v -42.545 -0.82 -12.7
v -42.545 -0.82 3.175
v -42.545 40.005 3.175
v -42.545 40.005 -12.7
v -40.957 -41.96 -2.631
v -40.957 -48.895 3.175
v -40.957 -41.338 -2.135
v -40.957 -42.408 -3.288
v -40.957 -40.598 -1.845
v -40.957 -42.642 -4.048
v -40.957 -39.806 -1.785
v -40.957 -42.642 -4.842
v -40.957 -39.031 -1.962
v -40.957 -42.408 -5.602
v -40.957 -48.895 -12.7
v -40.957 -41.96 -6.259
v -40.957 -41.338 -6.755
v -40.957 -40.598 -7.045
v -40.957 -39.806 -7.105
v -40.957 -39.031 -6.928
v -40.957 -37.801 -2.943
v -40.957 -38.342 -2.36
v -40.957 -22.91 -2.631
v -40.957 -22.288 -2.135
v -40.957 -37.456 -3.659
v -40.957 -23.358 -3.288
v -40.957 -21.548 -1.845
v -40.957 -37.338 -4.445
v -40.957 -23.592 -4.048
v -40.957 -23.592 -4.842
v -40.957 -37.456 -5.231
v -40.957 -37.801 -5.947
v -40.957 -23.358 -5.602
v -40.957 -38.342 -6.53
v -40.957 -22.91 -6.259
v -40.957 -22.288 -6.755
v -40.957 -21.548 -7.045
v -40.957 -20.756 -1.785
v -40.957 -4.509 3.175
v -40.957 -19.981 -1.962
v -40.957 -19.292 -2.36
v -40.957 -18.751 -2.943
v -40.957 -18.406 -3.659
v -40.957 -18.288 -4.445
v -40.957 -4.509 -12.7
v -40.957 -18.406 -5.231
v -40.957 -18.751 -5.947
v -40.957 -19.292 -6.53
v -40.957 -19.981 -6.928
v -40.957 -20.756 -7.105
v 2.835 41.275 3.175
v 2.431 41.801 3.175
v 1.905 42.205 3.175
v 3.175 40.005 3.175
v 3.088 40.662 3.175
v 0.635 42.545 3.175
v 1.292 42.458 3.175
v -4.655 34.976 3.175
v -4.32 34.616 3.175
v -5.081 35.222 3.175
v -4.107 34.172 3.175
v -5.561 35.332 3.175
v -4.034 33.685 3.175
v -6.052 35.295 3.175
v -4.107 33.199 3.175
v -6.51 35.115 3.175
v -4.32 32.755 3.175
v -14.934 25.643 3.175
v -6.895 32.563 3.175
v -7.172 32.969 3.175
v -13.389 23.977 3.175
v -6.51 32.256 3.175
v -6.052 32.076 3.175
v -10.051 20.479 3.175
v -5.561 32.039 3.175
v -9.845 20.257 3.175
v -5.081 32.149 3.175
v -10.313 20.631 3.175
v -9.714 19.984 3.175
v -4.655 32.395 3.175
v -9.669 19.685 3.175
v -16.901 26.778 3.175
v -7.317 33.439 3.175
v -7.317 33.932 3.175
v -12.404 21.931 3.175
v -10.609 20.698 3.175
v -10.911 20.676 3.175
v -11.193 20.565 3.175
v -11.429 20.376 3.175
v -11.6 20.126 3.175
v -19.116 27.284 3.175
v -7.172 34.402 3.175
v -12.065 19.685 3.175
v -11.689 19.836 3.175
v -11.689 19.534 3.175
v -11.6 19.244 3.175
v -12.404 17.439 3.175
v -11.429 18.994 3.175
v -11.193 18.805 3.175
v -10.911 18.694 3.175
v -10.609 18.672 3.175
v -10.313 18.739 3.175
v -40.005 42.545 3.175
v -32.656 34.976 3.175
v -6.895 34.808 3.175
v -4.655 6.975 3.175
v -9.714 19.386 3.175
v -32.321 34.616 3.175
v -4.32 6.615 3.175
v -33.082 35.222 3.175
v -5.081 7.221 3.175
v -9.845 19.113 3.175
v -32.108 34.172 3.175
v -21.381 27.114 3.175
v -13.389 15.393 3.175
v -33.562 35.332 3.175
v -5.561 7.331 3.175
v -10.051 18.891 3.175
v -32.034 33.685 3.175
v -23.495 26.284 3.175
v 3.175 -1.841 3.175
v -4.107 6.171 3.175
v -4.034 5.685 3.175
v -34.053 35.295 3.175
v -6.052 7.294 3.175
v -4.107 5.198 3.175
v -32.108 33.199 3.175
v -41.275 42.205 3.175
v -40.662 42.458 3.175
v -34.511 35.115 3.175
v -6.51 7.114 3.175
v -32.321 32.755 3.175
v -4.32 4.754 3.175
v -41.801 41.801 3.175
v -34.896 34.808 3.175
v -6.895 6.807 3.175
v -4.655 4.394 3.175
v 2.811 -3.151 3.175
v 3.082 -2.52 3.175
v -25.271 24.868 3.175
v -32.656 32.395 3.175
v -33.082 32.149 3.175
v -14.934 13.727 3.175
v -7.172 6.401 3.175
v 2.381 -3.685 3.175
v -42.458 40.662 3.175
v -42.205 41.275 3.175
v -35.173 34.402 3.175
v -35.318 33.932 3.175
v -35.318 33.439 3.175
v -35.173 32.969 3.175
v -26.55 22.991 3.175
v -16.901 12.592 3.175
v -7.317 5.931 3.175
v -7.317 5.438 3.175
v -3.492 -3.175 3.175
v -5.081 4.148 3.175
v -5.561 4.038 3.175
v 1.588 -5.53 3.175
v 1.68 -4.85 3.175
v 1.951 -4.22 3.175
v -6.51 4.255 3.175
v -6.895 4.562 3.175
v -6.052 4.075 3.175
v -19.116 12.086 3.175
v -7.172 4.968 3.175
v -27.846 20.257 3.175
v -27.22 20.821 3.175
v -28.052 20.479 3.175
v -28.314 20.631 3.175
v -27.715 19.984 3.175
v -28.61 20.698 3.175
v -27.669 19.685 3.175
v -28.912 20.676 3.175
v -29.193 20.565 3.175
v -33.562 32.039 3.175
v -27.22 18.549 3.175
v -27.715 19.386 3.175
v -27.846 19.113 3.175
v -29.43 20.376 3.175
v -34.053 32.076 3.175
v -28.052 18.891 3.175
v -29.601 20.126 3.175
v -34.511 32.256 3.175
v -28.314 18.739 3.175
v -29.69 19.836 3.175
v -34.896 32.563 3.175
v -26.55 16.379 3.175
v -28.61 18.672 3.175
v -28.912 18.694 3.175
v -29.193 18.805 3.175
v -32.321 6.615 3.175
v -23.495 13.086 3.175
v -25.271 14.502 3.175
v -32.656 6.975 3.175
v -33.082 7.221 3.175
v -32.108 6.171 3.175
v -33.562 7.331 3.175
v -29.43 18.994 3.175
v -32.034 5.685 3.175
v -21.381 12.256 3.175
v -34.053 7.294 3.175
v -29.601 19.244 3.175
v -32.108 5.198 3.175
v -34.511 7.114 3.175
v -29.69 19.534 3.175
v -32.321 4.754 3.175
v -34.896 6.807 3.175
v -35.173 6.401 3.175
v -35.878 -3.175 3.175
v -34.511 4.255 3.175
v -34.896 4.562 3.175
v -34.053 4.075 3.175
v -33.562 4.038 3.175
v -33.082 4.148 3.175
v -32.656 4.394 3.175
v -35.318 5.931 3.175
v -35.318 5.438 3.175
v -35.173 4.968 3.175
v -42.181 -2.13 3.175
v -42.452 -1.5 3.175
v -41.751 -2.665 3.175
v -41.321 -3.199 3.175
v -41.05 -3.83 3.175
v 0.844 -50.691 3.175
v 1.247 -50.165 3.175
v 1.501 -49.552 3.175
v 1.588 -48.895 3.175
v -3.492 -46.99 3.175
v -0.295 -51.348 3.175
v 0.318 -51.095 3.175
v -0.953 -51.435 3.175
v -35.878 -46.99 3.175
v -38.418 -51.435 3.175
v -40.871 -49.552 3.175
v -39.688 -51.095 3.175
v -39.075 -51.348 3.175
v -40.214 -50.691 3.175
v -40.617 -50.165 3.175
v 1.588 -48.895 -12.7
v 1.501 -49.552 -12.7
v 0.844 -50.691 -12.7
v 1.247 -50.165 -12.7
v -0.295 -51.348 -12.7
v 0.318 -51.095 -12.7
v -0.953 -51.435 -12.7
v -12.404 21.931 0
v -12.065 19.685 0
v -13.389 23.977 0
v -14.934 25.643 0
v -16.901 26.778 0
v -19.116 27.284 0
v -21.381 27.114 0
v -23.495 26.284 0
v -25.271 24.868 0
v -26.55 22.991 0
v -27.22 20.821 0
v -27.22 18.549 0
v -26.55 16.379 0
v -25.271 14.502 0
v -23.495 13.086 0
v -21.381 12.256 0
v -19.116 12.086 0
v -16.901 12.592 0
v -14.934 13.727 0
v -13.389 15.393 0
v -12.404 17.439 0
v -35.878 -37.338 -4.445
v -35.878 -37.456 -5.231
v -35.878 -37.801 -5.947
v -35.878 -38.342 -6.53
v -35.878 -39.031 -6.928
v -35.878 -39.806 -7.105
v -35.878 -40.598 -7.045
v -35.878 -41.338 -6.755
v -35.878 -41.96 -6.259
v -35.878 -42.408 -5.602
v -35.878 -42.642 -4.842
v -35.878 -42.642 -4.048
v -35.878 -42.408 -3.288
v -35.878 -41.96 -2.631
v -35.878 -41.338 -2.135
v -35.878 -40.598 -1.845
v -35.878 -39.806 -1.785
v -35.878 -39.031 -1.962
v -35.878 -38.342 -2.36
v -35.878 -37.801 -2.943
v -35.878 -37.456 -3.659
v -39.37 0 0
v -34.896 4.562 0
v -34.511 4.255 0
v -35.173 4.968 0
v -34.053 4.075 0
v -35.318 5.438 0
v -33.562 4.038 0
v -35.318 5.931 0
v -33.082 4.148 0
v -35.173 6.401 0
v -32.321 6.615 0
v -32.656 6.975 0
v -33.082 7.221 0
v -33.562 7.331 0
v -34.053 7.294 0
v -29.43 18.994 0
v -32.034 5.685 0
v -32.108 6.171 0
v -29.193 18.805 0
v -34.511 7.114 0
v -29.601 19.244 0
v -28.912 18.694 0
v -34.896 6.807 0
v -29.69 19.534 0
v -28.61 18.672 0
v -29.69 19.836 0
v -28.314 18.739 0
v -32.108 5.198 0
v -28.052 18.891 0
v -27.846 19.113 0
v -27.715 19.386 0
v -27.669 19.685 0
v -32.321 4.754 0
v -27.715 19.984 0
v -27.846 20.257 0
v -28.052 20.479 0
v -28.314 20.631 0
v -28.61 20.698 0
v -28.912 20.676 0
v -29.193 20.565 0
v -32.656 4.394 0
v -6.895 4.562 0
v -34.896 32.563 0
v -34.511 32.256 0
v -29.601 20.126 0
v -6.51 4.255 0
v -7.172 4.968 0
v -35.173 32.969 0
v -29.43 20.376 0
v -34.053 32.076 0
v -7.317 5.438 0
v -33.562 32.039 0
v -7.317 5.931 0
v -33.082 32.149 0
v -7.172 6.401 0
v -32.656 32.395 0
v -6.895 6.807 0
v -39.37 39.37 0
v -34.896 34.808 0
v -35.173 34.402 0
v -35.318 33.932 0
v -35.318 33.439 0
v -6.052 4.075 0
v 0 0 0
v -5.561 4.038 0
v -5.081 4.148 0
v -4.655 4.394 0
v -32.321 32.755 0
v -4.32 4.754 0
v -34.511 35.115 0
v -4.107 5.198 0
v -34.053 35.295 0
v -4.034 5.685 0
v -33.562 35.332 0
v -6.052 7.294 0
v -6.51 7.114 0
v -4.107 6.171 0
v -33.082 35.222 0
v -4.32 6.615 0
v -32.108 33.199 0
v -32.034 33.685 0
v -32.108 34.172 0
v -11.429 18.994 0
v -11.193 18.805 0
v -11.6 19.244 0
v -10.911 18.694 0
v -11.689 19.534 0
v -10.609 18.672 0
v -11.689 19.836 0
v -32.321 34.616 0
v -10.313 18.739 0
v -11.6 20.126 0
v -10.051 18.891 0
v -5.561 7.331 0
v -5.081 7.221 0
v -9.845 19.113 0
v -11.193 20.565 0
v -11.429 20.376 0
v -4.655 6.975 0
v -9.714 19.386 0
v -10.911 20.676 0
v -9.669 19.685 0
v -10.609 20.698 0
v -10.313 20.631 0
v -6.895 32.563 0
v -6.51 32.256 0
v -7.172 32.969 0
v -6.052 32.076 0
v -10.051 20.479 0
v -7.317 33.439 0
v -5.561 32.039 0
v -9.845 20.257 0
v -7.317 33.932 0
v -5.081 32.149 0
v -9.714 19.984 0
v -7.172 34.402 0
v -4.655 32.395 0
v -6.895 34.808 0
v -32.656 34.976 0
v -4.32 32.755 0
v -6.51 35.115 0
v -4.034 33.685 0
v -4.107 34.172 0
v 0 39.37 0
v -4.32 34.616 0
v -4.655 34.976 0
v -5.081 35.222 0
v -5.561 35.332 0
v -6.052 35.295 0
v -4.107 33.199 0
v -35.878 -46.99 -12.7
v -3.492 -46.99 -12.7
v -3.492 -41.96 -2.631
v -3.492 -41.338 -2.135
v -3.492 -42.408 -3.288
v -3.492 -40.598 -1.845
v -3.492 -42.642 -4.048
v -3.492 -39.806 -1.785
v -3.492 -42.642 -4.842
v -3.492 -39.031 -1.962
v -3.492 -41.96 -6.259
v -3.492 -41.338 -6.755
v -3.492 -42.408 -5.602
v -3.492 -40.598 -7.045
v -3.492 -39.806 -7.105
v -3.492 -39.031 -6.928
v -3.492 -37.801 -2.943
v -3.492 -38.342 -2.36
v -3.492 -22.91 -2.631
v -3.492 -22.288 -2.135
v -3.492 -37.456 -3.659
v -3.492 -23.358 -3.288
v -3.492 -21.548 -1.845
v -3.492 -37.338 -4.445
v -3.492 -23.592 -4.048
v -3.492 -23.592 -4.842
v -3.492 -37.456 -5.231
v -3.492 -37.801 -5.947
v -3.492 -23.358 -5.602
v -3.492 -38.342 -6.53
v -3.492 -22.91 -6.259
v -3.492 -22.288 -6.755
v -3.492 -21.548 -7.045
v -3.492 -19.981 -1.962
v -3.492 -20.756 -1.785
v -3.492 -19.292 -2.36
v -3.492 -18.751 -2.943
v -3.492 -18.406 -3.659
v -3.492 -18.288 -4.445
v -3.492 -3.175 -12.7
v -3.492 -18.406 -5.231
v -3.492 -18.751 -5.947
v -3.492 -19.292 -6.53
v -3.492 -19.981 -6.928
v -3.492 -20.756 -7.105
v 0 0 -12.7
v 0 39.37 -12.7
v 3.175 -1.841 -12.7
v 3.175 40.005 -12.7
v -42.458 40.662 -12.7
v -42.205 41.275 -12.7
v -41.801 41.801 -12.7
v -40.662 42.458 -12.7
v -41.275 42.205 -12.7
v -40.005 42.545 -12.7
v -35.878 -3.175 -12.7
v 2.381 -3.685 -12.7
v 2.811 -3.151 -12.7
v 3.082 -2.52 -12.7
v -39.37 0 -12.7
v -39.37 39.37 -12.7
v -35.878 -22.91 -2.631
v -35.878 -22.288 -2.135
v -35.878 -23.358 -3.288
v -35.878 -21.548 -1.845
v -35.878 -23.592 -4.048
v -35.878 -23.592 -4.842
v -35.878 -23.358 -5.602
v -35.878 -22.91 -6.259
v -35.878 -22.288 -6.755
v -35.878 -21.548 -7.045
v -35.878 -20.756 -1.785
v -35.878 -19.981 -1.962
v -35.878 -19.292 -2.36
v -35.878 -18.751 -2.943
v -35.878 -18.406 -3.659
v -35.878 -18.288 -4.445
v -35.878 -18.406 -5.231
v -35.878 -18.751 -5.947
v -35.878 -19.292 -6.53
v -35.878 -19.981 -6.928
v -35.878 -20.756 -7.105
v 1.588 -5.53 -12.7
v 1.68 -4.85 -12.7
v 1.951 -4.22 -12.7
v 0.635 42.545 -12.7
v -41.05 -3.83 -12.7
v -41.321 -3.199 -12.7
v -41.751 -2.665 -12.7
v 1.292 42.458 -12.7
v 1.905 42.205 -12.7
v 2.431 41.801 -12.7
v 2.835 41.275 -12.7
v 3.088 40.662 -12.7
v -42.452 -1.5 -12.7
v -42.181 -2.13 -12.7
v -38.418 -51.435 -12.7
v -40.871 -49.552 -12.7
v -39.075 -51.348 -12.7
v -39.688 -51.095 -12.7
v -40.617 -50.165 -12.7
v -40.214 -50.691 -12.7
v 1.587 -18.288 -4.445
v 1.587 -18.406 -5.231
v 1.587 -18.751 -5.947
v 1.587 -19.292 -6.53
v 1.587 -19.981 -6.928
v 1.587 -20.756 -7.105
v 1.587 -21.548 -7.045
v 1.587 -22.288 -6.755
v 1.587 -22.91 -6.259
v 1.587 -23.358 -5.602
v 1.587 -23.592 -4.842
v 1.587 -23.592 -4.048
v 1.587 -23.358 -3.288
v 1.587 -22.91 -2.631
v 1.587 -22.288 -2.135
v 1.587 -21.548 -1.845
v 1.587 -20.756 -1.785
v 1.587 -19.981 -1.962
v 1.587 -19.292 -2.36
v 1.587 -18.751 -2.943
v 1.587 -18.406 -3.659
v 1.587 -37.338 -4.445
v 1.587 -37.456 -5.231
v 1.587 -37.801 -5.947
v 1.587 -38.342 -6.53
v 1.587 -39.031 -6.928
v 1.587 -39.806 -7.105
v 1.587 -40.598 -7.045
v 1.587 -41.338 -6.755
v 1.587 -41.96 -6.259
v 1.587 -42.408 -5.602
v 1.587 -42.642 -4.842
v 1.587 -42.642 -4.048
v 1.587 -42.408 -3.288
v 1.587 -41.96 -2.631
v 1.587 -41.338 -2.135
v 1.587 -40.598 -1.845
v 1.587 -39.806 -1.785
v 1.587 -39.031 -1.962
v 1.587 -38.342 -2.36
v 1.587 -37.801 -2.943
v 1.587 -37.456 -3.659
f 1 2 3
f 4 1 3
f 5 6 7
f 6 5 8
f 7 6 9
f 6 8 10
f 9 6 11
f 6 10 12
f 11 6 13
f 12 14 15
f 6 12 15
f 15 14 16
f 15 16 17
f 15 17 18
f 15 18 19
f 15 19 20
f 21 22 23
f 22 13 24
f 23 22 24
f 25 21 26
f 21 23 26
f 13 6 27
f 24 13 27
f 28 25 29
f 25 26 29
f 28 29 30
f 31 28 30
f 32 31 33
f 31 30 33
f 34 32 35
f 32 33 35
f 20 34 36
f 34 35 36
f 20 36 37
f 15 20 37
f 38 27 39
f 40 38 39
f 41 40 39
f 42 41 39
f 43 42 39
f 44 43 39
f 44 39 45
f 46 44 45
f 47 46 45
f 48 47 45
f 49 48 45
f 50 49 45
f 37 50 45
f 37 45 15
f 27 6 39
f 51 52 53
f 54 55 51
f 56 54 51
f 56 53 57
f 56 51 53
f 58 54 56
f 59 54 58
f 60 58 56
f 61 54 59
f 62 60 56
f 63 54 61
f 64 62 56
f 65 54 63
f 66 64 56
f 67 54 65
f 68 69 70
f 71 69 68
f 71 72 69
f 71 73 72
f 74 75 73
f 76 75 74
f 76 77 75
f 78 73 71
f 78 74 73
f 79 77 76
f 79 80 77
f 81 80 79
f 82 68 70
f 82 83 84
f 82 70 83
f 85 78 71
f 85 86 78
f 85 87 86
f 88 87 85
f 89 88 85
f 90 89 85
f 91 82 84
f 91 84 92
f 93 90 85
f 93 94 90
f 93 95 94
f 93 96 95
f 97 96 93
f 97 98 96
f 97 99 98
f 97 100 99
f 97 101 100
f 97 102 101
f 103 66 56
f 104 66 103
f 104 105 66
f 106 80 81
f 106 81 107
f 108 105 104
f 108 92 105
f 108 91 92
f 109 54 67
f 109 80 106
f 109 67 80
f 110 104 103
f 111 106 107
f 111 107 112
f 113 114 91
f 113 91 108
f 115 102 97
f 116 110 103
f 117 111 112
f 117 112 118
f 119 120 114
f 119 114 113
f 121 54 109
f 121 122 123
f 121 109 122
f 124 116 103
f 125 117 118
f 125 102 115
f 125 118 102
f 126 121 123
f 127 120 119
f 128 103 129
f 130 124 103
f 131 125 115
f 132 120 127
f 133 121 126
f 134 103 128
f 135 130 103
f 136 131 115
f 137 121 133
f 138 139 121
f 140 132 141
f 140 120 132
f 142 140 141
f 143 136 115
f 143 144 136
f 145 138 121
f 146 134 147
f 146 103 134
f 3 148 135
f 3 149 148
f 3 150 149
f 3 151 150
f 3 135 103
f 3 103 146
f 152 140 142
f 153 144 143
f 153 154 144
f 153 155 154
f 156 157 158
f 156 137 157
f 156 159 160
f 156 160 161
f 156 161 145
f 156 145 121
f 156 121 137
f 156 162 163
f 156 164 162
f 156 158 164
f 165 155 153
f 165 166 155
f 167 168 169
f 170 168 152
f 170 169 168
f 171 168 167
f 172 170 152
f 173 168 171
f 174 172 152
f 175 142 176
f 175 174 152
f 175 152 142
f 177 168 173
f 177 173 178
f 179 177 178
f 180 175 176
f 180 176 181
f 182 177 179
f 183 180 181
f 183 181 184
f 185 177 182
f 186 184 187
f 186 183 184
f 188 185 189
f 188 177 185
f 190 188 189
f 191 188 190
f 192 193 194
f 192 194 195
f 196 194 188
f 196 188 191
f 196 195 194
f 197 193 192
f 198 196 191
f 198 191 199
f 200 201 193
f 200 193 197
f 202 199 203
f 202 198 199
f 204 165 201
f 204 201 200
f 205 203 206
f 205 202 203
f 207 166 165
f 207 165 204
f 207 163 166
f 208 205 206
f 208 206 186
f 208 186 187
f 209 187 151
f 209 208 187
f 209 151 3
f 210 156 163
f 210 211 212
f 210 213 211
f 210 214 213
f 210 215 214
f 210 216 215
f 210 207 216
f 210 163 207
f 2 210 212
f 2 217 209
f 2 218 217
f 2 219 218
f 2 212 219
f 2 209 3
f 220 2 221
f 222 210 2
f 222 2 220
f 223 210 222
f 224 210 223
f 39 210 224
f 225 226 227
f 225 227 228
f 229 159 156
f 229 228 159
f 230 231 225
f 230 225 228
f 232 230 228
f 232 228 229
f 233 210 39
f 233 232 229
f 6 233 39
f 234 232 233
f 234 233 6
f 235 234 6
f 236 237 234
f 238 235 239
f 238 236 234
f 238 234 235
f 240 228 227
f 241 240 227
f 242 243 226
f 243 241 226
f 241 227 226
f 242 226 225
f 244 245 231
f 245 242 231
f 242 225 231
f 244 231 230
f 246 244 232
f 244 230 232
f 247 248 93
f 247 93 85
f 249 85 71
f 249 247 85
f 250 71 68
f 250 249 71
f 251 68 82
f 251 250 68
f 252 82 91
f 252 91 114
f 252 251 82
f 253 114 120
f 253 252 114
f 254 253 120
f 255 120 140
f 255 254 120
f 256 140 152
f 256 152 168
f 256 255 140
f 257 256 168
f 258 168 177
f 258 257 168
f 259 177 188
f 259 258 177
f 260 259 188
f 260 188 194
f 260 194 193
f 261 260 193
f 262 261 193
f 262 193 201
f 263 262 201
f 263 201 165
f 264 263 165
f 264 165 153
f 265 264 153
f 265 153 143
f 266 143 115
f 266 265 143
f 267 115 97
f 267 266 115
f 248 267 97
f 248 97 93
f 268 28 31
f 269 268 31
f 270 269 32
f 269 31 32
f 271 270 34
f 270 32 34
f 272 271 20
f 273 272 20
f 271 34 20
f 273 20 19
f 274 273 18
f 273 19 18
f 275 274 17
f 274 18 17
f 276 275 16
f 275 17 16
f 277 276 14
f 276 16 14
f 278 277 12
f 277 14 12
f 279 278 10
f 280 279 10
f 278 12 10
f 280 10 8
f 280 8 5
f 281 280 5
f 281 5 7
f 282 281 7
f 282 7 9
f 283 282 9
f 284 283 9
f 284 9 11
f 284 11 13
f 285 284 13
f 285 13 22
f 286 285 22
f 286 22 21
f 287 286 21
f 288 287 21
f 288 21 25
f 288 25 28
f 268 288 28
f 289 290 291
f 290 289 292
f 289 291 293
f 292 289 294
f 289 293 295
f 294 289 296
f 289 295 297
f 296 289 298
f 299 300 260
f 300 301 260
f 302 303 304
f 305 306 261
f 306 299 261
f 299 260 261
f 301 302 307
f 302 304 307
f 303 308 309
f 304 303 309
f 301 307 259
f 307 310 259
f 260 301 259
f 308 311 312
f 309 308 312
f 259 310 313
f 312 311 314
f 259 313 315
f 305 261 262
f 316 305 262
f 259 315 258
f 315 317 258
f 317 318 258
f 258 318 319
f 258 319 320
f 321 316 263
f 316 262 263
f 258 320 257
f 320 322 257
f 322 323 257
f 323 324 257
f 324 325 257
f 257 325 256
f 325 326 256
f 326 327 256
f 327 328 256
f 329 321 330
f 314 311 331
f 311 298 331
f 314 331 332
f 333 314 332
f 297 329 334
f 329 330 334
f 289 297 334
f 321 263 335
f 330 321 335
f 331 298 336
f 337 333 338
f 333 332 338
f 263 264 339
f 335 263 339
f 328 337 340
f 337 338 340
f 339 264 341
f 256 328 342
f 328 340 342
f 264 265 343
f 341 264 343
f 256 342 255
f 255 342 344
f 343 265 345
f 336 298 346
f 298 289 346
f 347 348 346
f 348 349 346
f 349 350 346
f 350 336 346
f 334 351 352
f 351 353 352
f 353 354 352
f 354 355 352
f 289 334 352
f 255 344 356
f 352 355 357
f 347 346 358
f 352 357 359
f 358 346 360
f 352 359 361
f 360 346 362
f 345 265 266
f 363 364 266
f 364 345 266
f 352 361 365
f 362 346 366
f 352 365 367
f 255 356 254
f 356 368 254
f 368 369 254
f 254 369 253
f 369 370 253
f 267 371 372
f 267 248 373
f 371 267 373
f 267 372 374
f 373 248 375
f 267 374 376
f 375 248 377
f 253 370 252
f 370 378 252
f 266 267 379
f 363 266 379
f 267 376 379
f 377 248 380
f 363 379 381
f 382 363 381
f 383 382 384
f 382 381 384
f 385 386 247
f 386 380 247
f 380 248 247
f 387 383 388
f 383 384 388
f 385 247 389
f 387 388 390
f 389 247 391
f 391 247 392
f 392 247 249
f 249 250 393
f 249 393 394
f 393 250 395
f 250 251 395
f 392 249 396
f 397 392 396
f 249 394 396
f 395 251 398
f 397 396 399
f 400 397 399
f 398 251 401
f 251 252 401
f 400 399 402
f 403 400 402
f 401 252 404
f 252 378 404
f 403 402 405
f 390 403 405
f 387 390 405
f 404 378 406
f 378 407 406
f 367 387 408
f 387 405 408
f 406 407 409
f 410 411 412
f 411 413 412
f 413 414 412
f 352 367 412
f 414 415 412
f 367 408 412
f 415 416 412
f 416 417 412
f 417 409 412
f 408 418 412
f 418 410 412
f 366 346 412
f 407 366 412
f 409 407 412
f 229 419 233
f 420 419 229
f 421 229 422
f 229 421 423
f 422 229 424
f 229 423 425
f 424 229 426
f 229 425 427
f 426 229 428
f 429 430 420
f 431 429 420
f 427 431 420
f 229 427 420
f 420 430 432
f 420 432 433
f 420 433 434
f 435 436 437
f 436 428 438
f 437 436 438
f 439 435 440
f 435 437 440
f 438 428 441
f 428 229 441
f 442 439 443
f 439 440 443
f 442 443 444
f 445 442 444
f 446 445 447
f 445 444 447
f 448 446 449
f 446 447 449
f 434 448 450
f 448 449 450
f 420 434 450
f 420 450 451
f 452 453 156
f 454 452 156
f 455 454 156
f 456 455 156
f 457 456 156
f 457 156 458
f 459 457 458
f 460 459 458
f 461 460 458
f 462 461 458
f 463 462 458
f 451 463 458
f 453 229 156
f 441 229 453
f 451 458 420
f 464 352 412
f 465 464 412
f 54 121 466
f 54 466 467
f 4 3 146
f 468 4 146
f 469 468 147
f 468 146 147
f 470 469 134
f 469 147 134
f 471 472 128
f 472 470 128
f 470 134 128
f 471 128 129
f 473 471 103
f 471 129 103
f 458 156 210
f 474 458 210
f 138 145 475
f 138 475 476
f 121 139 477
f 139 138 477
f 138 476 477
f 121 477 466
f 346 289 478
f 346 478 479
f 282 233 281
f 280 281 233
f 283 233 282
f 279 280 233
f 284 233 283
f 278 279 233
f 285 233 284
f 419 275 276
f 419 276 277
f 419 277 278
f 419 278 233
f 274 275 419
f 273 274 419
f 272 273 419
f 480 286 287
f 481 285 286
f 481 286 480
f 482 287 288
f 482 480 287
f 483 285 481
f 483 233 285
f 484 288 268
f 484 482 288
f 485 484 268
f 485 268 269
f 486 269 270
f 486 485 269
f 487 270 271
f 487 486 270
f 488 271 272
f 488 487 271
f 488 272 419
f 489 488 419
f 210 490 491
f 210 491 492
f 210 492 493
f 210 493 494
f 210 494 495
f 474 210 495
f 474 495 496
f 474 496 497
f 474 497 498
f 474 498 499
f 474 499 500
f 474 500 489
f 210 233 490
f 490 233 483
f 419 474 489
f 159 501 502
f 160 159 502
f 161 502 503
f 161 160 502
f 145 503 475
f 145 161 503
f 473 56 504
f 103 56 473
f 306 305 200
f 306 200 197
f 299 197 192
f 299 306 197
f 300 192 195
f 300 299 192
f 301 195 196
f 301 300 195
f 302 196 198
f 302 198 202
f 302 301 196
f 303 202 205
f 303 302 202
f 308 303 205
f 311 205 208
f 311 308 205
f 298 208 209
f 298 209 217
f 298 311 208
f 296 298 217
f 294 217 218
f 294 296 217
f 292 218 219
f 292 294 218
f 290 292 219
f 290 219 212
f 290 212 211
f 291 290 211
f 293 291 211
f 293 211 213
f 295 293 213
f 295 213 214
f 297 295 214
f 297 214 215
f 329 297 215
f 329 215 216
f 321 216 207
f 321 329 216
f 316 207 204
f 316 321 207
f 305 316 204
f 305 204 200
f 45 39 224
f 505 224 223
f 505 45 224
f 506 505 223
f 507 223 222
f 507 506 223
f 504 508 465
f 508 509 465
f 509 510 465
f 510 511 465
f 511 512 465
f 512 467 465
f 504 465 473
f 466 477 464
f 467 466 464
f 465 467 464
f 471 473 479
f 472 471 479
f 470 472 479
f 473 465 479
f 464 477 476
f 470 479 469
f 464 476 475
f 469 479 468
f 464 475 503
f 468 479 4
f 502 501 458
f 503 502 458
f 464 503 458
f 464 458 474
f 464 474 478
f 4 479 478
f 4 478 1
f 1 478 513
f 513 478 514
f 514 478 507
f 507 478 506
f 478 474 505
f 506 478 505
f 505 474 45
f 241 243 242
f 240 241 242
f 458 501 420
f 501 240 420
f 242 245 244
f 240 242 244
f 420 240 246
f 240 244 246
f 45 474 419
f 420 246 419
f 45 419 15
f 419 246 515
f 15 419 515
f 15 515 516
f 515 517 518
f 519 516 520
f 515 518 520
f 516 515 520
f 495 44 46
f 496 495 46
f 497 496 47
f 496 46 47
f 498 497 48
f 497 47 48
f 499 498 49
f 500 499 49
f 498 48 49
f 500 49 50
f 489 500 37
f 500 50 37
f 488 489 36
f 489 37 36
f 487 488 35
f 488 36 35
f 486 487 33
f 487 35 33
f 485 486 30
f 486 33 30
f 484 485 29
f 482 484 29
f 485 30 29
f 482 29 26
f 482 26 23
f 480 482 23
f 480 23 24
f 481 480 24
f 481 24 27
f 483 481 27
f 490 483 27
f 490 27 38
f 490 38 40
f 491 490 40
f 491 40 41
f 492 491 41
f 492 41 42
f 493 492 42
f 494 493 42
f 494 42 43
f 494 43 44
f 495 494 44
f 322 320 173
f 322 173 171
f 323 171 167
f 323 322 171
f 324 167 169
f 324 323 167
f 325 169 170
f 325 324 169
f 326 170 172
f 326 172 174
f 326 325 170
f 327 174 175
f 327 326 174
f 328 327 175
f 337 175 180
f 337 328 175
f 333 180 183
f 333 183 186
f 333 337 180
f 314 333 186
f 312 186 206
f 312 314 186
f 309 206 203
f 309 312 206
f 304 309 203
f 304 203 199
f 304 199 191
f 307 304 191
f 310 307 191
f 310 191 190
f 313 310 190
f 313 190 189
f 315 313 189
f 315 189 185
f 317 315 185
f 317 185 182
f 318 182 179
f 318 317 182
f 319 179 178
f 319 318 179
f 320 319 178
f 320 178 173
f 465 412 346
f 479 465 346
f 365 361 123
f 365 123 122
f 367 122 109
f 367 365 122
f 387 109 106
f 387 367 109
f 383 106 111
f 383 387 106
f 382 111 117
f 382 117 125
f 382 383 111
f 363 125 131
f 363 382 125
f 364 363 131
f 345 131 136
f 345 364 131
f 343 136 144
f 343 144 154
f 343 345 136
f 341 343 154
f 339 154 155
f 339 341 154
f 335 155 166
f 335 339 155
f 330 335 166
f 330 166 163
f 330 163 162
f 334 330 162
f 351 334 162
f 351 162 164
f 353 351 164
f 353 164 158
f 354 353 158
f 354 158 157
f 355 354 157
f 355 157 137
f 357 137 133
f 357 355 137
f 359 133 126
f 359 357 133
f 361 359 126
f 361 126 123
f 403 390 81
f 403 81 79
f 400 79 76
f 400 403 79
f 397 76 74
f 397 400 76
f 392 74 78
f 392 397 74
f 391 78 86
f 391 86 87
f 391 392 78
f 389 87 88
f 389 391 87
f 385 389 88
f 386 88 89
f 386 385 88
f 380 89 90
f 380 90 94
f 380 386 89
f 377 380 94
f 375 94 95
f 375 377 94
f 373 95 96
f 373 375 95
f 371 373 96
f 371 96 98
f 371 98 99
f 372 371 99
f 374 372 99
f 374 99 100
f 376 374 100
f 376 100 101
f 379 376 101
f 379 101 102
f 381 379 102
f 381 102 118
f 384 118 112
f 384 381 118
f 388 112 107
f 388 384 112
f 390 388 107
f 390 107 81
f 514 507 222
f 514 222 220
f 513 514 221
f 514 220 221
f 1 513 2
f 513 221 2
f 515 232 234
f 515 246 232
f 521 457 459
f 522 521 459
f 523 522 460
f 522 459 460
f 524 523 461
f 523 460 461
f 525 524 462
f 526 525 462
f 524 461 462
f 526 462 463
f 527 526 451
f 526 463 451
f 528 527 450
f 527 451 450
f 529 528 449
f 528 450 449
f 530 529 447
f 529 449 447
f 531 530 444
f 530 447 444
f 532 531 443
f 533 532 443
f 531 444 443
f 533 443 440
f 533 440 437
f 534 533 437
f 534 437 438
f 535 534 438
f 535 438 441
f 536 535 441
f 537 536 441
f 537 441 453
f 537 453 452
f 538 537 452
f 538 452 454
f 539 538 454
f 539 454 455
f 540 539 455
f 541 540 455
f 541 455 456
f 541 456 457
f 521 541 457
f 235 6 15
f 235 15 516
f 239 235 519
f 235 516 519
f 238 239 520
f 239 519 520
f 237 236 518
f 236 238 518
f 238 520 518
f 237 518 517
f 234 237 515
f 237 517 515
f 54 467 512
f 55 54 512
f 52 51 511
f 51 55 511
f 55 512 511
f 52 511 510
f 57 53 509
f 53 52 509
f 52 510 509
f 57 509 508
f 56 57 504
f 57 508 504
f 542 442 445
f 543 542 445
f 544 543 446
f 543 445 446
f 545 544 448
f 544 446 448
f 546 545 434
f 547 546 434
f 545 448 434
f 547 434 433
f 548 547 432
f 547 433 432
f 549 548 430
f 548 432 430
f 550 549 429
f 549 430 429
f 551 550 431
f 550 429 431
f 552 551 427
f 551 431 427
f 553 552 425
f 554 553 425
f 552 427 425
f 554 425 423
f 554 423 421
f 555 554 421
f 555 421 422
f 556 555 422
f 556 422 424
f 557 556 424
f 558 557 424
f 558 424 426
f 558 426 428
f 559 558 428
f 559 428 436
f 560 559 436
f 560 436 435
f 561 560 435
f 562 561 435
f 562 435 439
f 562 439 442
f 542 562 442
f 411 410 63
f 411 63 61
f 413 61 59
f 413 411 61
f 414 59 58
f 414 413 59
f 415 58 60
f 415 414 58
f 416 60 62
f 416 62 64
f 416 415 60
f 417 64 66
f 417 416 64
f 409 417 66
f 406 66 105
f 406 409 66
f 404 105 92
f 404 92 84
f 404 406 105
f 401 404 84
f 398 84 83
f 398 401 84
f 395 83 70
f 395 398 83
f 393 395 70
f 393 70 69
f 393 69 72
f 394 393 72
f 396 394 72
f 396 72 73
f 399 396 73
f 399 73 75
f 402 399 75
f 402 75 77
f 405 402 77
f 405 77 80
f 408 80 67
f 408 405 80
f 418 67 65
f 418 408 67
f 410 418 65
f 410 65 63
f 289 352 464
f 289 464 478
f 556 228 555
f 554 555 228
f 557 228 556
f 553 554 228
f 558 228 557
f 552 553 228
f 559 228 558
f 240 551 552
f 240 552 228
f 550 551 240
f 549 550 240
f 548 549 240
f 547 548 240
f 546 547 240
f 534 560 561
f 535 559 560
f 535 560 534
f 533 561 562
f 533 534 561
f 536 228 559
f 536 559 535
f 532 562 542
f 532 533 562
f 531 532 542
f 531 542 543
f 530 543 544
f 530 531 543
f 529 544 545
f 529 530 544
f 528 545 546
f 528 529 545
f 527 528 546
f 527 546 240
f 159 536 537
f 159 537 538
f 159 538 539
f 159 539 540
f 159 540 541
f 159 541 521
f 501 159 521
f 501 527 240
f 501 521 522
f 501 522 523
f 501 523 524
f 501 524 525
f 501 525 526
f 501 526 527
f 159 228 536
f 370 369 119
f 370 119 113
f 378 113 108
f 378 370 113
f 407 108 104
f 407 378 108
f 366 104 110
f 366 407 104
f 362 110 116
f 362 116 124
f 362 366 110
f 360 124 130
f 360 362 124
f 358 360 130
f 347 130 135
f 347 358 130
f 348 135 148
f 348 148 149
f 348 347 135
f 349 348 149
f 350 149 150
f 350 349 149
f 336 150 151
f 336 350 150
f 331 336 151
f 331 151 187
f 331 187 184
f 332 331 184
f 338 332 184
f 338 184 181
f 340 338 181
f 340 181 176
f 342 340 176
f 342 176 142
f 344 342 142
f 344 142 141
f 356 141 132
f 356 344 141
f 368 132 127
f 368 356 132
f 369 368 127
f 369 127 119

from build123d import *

# Parameters (mm, degrees)
SKETCH1_W                = 39.37
SKETCH1_H                = 39.37
SKETCH1_R                = 1.651
SKETCH1_R_2              = 7.62
SKETCH1_R_3              = 1.016
BOSS_EXTRUDE1_DEPTH      = 3.175
BOSS_EXTRUDE2_DEPTH      = 12.7
BOSS_EXTRUDE2_DEPTH_BACK = 3.175
SKETCH3_W                = 45.72
SKETCH3_H                = 45.72
SKETCH3_W_2              = 39.37
SKETCH3_H_2              = 39.37
SKETCH5_W                = 5.08
SKETCH5_H                = 15.875
BOSS_EXTRUDE3_DEPTH      = 48.26
SKETCH6_W                = 42.545
SKETCH6_H                = 15.875
BOSS_EXTRUDE4_DEPTH      = 4.445
SKETCH7_R                = 2.667
CUT_EXTRUDE1_DEPTH       = 70.979765826
FILLET1_R                = 2.54
FILLET2_R                = 2.54
FILLET3_R                = 2.54


with BuildPart() as part:
    # Sketch1 → Boss-Extrude1 (new body)
    with BuildSketch(Plane.XY):
        with Locations((-19.685, 19.685)):
            Rectangle(SKETCH1_W, SKETCH1_H)
        with Locations((-33.68548, 5.68452)):
            Circle(SKETCH1_R, mode=Mode.SUBTRACT)
        with Locations((-33.68548, 33.68548)):
            Circle(SKETCH1_R, mode=Mode.SUBTRACT)
        with Locations((-5.68452, 5.68452)):
            Circle(SKETCH1_R, mode=Mode.SUBTRACT)
        with Locations((-5.68452, 33.68548)):
            Circle(SKETCH1_R, mode=Mode.SUBTRACT)
        with Locations((-19.685, 19.685)):
            Circle(SKETCH1_R_2, mode=Mode.SUBTRACT)
        with Locations((-28.68549, 19.685)):
            Circle(SKETCH1_R_3, mode=Mode.SUBTRACT)
        with Locations((-10.68451, 19.685)):
            Circle(SKETCH1_R_3, mode=Mode.SUBTRACT)
    extrude(amount=BOSS_EXTRUDE1_DEPTH)

    # Sketch3 → Boss-Extrude2 (add, two sides: drawn at the far end of the back side and taken through both)
    with BuildSketch(Plane(origin=(0, 0, 0), x_dir=(-1, 0, 0), z_dir=(0, 0, -1)).offset(-BOSS_EXTRUDE2_DEPTH_BACK)):
        with Locations((19.685, 19.685)):
            Rectangle(SKETCH3_W, SKETCH3_H)
        with Locations((19.685, 19.685)):
            Rectangle(SKETCH3_W_2, SKETCH3_H_2, mode=Mode.SUBTRACT)
    extrude(amount=BOSS_EXTRUDE2_DEPTH + BOSS_EXTRUDE2_DEPTH_BACK)

    # Sketch5 → Boss-Extrude3 (add)
    with BuildSketch(Plane(origin=(0, -3.175, 0), x_dir=(-1, 0, 0), z_dir=(0, -1, 0))):
        with Locations((38.4175, 4.7625)):
            Rectangle(SKETCH5_W, SKETCH5_H)
        with Locations((0.9525, 4.7625)):
            Rectangle(SKETCH5_W, SKETCH5_H)
    extrude(amount=BOSS_EXTRUDE3_DEPTH)

    # Sketch6 → Boss-Extrude4 (add)
    with BuildSketch(Plane(origin=(-35.8775, -51.435, -12.7), x_dir=(1, 0, 0), z_dir=(0, 1, 0))):
        with Locations((16.1925, -7.9375)):
            Rectangle(SKETCH6_W, SKETCH6_H)
    extrude(amount=BOSS_EXTRUDE4_DEPTH)

    # Sketch7 → Cut-Extrude1 (cut, through all)
    with BuildSketch(Plane.ZY.offset(42.545)):
        with Locations(Location((-4.445, -40.005, 0), (0, 0, 90))):
            Circle(SKETCH7_R)
        with Locations(Location((-4.445, -20.955, 0), (0, 0, 90))):
            Circle(SKETCH7_R)
    extrude(amount=-CUT_EXTRUDE1_DEPTH, mode=Mode.SUBTRACT)

    # Fillet1
    # the kernel refuses this fillet: 2.54 mm, written as the material it adds along each edge
    with BuildSketch(Plane(origin=(1.5875, -3.175, 3.175), x_dir=(1, 0, 0), z_dir=(0, 0, -1))) as fillet1_piece_1:
        with BuildLine():
            CenterArc((2.54, 2.35464302), FILLET1_R, 180, 67.975687163)
            Line((0, 2.35464302), (0, 0))
            Line((0, 0), (1.5875, 0))
        make_face()
    extrude(amount=15.875)
    # the kernel refuses this fillet: 2.54 mm, written as the material it takes off along each edge
    with BuildSketch(Plane(origin=(-40.9575, -51.435, -19.05), x_dir=(1, 0, 0), z_dir=(0, 0, 1))) as fillet1_2_piece_1:
        with BuildLine():
            CenterArc((FILLET1_R, FILLET1_R), FILLET1_R, 180, 90)
            Line((0, FILLET1_R), (0, 0))
            Line((0, 0), (FILLET1_R, 0))
        make_face()
    extrude(amount=28.575, mode=Mode.SUBTRACT)
    with BuildSketch(Plane(origin=(1.5875, -51.435, 9.525), x_dir=(0, 1, 0), z_dir=(0, 0, -1))) as fillet1_2_piece_2:
        with BuildLine():
            CenterArc((FILLET1_R, -FILLET1_R), FILLET1_R, 90, 90)
            Line((0, -FILLET1_R), (0, 0))
            Line((0, 0), (FILLET1_R, 0))
        make_face()
    extrude(amount=28.575, mode=Mode.SUBTRACT)

    # Fillet2
    # the kernel refuses this fillet: 2.54 mm, written as the material it takes off along each edge
    with BuildSketch(Plane(origin=(-42.545, -3.175, 9.061607549), x_dir=(1, 0, 0), z_dir=(0, 0, -1))) as fillet2_piece_1:
        with BuildLine():
            CenterArc((2.54, -2.35464302), FILLET2_R, 112.024312837, 67.975687163)
            Line((0, -2.35464302), (-0.0508, -2.35464302))
            Line((-0.0508, -2.35464302), (-0.0508, 0))
            Line((-0.0508, 0), (0, 0.0508))
            ThreePointArc((0, 0.0508), (0.79375, 0.0508), (1.56845, 0.04709286))
            Line((1.56845, 0.04709286), (1.5875, 0))
        make_face()
    extrude(amount=27.648215098, mode=Mode.SUBTRACT)
    with BuildSketch(Plane(origin=(3.175, 42.545, -19.05), x_dir=(0, -1, 0), z_dir=(0, 0, 1))) as fillet2_piece_2:
        with BuildLine():
            CenterArc((FILLET2_R, -FILLET2_R), FILLET2_R, 90, 90)
            Line((0, -FILLET2_R), (-FILLET2_R * 0.02, -FILLET2_R))
            Line((-FILLET2_R * 0.02, -FILLET2_R), (-FILLET2_R * 0.02, FILLET2_R * 0.02))
            Line((-FILLET2_R * 0.02, FILLET2_R * 0.02), (FILLET2_R, FILLET2_R * 0.02))
            Line((FILLET2_R, FILLET2_R * 0.02), (FILLET2_R, 0))
        make_face()
    extrude(amount=28.575, mode=Mode.SUBTRACT)
    with BuildSketch(Plane(origin=(-42.545, 42.545, 9.525), x_dir=(1, 0, 0), z_dir=(0, 0, -1))) as fillet2_piece_3:
        with BuildLine():
            CenterArc((FILLET2_R, FILLET2_R), FILLET2_R, 180, 90)
            Line((0, FILLET2_R), (-FILLET2_R * 0.02, FILLET2_R))
            Line((-FILLET2_R * 0.02, FILLET2_R), (-FILLET2_R * 0.02, -FILLET2_R * 0.02))
            Line((-FILLET2_R * 0.02, -FILLET2_R * 0.02), (FILLET2_R, -FILLET2_R * 0.02))
            Line((FILLET2_R, -FILLET2_R * 0.02), (FILLET2_R, 0))
        make_face()
    extrude(amount=28.575, mode=Mode.SUBTRACT)
    with BuildSketch(Plane(origin=(3.175, -3.175, -16.035934044), x_dir=(-0.8412426627142054, -0.5406577313139188, 0), z_dir=(0, 0, 1))) as fillet2_piece_4:
        with BuildLine():
            CenterArc((1.41531695, -2.495802653), FILLET2_R, 100.70411186, 46.567463442)
            Line((-0.721439413, -1.122532015), (-0.76417454, -1.095066602))
            Line((-0.76417454, -1.095066602), (-0.042735127, 0.027465413))
            Line((-0.042735127, 0.027465413), (0.009435446, 0.049916053))
            ThreePointArc((0.009435446, 0.049916053), (0.471772317, 0.006602653), (0.934109187, 0.049916053))
            Line((0.934109187, 0.049916053), (0.943544634, 0))
        make_face()
    extrude(amount=22.546868088, mode=Mode.SUBTRACT)

    # Fillet3
    fillet3_edges = [part.edges().sort_by_distance(p)[0] for p in [
        (-40.9575, -3.175, -4.7625),
    ]]
    fillet(fillet3_edges, radius=FILLET3_R)


solid = part.part
